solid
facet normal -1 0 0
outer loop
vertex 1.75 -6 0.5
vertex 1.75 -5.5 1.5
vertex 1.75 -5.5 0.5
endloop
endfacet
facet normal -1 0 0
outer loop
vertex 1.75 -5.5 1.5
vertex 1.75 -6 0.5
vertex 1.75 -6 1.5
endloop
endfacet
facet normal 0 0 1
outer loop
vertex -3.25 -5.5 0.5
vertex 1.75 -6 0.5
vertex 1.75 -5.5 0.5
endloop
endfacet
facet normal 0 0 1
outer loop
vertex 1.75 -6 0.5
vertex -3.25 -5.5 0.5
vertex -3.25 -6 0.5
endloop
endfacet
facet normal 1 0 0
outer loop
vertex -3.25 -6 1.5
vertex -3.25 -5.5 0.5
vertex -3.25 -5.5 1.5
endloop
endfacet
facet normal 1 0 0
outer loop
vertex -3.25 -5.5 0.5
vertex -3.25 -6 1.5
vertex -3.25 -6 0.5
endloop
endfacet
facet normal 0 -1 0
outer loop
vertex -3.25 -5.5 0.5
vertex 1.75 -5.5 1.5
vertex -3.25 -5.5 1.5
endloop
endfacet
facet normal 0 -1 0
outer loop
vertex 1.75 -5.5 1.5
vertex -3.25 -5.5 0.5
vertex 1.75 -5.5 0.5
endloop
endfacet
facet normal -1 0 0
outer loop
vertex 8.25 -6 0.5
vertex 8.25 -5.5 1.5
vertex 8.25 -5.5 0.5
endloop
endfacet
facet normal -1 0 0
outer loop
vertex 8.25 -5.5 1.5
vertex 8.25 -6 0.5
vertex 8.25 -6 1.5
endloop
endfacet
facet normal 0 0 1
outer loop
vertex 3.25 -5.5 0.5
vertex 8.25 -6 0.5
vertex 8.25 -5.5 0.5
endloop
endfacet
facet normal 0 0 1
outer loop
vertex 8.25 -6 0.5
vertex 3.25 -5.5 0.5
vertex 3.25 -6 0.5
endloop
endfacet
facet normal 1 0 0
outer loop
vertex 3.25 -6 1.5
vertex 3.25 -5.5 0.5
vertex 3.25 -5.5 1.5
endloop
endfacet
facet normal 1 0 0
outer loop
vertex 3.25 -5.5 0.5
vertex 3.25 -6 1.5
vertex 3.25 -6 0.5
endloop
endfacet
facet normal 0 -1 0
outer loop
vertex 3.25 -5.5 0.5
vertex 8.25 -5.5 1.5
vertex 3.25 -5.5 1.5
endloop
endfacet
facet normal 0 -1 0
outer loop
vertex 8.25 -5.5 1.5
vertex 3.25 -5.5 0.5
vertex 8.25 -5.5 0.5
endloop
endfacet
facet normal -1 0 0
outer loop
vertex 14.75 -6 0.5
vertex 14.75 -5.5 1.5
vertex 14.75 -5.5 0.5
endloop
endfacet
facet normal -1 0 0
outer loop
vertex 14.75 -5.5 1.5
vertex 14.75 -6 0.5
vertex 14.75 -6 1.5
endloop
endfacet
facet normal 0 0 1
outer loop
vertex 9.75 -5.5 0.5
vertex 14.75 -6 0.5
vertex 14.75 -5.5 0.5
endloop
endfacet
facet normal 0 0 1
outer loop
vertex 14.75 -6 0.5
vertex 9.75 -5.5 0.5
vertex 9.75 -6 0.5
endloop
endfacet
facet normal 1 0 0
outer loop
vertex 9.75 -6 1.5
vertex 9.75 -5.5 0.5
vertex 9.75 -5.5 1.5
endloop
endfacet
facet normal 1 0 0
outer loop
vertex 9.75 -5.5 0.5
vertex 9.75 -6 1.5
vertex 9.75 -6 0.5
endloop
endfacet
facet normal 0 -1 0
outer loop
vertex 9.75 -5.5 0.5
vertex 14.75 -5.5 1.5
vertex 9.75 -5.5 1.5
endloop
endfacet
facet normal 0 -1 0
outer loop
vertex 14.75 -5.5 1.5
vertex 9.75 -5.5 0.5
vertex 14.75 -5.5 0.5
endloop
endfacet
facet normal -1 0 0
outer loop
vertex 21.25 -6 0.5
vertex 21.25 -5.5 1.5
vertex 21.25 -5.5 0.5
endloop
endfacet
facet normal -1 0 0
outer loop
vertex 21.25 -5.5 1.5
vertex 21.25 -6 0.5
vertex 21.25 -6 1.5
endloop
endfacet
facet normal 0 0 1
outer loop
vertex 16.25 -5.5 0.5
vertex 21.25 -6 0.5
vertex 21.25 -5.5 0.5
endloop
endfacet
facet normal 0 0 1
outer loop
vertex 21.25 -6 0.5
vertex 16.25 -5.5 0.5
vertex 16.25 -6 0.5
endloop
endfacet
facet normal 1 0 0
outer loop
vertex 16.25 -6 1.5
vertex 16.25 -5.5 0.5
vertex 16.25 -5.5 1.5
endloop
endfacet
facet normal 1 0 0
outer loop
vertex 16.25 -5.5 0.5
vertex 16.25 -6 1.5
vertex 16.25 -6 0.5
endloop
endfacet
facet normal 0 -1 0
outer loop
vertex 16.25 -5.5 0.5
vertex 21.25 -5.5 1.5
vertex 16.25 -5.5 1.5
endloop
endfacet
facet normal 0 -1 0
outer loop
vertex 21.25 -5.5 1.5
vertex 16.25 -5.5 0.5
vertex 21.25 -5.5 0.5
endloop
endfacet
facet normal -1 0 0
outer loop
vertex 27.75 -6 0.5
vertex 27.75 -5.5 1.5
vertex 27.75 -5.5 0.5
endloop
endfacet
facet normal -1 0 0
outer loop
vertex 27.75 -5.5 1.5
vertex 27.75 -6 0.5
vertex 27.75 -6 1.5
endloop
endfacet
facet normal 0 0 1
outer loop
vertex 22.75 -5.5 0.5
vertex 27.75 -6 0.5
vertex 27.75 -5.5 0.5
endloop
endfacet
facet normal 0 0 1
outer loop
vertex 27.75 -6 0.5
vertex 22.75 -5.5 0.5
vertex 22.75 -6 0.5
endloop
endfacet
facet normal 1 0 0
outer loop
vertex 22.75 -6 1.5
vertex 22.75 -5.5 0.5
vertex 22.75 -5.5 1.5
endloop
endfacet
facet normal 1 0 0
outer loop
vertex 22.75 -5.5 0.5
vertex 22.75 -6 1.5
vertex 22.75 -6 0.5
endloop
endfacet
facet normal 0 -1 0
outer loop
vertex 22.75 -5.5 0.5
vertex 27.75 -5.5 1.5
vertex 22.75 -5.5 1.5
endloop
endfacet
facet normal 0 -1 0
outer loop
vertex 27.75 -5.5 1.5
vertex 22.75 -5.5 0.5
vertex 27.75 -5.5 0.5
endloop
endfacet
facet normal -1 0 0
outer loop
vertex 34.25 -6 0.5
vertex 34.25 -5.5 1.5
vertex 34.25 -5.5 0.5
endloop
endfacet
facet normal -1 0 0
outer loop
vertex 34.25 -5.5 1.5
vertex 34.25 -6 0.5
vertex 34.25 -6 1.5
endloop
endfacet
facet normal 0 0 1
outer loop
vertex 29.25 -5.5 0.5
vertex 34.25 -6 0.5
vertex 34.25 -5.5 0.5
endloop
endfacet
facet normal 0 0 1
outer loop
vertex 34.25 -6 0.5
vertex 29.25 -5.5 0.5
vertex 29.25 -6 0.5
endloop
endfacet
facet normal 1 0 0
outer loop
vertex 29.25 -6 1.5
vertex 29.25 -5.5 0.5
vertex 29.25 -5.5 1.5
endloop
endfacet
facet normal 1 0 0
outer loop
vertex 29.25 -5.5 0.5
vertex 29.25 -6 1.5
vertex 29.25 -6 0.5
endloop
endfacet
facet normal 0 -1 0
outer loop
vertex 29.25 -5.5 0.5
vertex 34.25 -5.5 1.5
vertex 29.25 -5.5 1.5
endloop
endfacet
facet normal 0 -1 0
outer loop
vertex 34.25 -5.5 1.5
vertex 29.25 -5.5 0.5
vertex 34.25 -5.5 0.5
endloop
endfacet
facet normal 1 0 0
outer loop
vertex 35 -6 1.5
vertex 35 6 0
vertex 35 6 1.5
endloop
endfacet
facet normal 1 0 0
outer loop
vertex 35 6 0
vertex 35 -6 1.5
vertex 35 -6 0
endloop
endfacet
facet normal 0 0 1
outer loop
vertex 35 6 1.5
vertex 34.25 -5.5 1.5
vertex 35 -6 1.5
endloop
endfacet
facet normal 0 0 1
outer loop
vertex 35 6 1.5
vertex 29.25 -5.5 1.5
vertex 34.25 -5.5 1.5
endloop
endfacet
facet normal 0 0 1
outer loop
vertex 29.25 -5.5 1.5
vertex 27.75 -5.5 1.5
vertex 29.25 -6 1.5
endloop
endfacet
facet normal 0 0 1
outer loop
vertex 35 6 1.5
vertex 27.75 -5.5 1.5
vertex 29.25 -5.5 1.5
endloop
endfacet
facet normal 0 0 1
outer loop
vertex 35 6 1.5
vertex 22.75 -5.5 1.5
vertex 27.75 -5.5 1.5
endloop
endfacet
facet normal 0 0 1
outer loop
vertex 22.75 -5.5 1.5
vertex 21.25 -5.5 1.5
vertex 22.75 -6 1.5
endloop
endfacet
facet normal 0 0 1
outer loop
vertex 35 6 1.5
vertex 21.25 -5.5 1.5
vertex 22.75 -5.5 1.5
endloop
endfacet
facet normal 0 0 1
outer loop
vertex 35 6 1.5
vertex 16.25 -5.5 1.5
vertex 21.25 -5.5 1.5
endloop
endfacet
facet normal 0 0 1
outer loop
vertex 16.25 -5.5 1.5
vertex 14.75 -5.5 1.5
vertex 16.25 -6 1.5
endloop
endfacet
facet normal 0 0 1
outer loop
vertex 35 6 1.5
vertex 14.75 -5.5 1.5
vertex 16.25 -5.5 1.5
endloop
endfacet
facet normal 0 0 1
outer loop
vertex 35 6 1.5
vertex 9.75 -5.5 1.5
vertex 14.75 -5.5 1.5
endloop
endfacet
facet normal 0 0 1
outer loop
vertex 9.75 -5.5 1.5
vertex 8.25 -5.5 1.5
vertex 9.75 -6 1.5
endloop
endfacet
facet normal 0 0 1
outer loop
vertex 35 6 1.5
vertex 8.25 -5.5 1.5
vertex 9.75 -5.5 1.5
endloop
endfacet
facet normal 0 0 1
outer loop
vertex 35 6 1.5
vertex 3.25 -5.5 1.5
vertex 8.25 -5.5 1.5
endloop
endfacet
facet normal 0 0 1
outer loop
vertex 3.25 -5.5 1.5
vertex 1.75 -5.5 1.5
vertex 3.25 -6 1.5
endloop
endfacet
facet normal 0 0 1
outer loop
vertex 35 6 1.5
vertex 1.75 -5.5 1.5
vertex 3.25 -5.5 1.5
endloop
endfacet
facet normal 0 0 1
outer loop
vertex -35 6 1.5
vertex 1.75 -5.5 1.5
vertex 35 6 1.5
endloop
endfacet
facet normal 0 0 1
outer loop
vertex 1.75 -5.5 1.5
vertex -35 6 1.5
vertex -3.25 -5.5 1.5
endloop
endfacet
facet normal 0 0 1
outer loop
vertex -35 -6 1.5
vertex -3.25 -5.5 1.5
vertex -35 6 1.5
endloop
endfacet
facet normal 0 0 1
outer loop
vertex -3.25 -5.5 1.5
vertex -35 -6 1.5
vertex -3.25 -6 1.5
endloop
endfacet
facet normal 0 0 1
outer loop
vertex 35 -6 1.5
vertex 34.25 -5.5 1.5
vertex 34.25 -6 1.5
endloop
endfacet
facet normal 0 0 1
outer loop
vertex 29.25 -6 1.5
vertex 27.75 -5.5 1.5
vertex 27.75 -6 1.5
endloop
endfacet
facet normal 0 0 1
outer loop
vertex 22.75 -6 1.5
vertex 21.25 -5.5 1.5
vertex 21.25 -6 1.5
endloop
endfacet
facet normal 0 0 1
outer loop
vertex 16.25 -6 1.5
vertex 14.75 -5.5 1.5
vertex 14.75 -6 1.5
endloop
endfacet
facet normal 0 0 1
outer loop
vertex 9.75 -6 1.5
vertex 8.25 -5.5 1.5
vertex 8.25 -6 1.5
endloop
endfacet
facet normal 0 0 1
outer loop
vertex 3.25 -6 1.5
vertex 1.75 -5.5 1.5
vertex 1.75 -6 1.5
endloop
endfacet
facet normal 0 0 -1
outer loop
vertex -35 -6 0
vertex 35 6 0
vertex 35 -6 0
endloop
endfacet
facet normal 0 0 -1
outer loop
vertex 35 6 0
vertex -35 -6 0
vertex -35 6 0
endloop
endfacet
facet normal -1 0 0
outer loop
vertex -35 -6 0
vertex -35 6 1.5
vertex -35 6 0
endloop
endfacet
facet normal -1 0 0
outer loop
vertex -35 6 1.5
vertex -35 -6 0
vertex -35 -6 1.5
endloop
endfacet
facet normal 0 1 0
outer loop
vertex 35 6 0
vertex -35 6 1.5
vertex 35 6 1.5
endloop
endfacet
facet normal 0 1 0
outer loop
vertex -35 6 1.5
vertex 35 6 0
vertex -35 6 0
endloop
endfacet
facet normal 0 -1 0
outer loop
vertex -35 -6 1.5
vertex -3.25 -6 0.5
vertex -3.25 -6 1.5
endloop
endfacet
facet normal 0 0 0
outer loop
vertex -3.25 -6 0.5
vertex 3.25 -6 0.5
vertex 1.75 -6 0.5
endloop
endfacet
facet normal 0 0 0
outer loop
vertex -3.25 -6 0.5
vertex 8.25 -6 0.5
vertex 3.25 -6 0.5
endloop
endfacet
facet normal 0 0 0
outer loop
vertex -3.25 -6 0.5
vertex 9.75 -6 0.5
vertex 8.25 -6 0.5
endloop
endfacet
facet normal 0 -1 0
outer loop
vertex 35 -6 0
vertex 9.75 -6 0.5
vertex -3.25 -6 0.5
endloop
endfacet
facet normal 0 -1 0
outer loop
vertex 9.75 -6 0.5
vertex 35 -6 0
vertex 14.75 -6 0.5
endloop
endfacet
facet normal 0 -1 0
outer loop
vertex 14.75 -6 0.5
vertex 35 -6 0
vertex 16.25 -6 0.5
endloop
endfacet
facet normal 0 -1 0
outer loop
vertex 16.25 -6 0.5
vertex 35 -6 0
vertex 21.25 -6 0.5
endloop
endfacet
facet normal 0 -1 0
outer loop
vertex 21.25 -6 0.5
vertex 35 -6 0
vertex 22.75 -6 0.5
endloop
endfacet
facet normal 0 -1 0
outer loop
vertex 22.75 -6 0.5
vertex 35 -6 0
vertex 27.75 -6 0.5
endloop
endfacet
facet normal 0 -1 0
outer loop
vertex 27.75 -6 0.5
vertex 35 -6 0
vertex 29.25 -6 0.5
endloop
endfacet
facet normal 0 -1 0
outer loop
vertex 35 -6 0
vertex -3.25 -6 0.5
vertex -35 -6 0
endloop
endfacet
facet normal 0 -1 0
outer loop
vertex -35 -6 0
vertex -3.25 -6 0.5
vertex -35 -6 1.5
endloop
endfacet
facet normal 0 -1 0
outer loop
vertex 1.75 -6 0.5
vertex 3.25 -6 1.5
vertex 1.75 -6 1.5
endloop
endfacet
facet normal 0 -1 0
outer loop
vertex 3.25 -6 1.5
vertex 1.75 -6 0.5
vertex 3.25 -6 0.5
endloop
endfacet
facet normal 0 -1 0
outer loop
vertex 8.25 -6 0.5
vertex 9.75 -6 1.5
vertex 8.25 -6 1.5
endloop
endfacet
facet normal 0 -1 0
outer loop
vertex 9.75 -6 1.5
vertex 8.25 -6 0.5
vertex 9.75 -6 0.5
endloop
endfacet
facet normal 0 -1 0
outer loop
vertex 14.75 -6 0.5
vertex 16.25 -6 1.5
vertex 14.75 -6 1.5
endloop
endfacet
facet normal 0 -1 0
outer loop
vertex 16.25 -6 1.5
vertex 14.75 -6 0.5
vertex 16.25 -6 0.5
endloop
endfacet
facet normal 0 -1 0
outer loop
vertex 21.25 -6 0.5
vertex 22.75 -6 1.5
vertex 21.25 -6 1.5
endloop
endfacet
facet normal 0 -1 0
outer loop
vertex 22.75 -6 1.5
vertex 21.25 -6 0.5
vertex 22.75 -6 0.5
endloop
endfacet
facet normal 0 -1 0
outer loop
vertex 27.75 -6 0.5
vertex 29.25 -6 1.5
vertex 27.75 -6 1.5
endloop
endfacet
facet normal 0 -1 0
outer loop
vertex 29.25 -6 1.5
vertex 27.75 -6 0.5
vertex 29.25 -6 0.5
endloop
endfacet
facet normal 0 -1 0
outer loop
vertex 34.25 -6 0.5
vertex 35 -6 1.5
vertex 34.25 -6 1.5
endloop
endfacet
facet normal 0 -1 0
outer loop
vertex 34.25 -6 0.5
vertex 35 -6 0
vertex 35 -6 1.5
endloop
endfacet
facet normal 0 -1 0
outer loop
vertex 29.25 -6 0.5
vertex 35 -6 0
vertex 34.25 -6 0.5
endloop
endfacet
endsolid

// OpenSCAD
// 10-well comb for casting agarose gels, printed lying flat
// Units: mm

// ---- Spine (back bar) ----
spine_len   = 70;   // spine length along X
spine_wid   = 12;   // spine width along Y
plate_thk   = 1.5;  // plate thickness along Z

// ---- Teeth ----
tooth_count = 10;   // number of teeth
tooth_w     = 5.0;  // tooth width along X
tooth_l     = 12;   // tooth length along Y (hangs in -Y)
tooth_gap   = 1.5;  // gap between neighbouring teeth along X

// ---- Misc ----
eps = 0.5;          // overcut for clean differences
$fn = 64;

// Derived
row_len    = tooth_count * tooth_w + (tooth_count - 1) * tooth_gap;  // 56.5 mm
overhang   = (spine_len - row_len) / 2;                              // centre offset in X

difference() {
    // Base plate (spine + teeth area)
    translate([-spine_len / 2, -spine_wid / 2, 0])
        cube([spine_len, spine_wid, plate_thk]);

    // Teeth cut out from the top face, extending past the +Z face
    for (i = [0 : tooth_count - 1]) {
        x = -overhang + i * (tooth_w + tooth_gap);
        translate([x, -spine_wid / 2 - tooth_l, eps])
            cube([tooth_w, tooth_l + eps, plate_thk + eps]);
    }
}
